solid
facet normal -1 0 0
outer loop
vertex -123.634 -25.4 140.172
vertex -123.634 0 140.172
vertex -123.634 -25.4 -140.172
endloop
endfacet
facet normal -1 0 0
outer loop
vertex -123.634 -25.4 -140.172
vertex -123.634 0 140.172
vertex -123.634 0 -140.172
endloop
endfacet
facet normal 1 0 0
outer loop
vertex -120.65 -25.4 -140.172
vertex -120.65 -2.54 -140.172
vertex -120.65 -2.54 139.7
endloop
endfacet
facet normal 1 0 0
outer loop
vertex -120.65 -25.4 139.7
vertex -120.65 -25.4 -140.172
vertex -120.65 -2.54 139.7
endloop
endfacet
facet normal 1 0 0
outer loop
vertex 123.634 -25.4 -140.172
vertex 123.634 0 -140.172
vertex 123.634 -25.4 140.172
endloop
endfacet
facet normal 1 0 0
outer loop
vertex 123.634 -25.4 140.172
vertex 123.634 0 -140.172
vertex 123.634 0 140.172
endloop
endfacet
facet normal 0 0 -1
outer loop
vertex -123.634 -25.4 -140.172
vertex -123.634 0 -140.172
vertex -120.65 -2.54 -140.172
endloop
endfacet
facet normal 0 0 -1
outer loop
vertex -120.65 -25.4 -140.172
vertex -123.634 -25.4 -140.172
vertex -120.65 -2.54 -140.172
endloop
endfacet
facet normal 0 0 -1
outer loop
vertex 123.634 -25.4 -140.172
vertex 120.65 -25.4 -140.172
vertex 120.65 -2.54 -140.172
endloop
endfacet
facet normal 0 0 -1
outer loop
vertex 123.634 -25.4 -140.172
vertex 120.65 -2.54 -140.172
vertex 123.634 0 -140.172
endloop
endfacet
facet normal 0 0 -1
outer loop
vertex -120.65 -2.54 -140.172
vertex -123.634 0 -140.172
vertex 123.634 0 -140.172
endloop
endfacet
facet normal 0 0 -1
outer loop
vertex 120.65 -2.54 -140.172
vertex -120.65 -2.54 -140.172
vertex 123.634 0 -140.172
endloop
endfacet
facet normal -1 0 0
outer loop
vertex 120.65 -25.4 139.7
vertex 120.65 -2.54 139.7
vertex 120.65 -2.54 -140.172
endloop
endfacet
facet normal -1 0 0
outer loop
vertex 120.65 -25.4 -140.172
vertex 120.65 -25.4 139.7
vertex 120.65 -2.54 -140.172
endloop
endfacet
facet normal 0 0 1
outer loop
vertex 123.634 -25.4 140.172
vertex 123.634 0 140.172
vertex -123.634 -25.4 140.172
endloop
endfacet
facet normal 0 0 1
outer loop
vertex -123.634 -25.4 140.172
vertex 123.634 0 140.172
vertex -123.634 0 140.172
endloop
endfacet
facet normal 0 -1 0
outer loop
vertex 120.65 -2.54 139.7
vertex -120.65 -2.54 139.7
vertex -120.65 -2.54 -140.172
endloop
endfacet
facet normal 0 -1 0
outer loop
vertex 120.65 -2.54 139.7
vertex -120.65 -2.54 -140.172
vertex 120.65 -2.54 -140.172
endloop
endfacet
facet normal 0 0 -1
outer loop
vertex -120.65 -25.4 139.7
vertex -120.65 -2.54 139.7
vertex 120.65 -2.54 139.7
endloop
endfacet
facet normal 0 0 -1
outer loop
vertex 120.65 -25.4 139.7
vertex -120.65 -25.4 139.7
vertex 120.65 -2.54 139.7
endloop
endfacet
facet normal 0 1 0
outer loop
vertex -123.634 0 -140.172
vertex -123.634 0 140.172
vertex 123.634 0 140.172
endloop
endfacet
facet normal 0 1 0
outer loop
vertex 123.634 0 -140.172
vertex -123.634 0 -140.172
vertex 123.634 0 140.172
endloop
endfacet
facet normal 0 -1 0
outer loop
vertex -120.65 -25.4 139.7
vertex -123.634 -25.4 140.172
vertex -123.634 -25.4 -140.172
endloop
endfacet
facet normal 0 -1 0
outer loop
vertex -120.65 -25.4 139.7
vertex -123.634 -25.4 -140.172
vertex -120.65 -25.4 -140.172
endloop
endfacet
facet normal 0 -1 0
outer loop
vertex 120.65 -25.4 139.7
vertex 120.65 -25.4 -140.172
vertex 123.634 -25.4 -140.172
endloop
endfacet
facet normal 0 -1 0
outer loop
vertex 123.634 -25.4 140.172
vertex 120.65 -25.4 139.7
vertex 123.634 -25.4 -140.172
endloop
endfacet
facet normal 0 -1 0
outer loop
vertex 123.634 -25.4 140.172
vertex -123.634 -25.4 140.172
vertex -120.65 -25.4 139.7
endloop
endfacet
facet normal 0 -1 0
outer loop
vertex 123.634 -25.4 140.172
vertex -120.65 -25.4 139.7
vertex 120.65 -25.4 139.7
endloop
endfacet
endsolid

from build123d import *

# Parameters (mm, degrees)
F1_DEPTH = 25.4
F2_DEPTH = 2.54


with BuildPart() as f1:
    # F0 (on Front) → F1 (new body)
    with BuildSketch(Plane.XZ):
        Polygon((-120.65, 139.7), (120.65, 139.7), (120.65, -139.7), (120.65, -140.171826), (123.63416, -140.171826), (123.63416, 140.171826), (-123.63416, 140.171826), (-123.63416, -140.171826), (-120.65, -140.171826), (-120.65, -139.7), align=None)
    extrude(amount=F1_DEPTH)

    # F0 (on Front) → F2 (join)
    with BuildSketch(Plane.XZ):
        Polygon((120.65, -139.7), (120.65, 139.7), (-120.65, 139.7), (-120.65, -139.7), (-120.65, -140.171826), (120.65, -140.171826), align=None)
    extrude(amount=F2_DEPTH)


solid = f1.part
